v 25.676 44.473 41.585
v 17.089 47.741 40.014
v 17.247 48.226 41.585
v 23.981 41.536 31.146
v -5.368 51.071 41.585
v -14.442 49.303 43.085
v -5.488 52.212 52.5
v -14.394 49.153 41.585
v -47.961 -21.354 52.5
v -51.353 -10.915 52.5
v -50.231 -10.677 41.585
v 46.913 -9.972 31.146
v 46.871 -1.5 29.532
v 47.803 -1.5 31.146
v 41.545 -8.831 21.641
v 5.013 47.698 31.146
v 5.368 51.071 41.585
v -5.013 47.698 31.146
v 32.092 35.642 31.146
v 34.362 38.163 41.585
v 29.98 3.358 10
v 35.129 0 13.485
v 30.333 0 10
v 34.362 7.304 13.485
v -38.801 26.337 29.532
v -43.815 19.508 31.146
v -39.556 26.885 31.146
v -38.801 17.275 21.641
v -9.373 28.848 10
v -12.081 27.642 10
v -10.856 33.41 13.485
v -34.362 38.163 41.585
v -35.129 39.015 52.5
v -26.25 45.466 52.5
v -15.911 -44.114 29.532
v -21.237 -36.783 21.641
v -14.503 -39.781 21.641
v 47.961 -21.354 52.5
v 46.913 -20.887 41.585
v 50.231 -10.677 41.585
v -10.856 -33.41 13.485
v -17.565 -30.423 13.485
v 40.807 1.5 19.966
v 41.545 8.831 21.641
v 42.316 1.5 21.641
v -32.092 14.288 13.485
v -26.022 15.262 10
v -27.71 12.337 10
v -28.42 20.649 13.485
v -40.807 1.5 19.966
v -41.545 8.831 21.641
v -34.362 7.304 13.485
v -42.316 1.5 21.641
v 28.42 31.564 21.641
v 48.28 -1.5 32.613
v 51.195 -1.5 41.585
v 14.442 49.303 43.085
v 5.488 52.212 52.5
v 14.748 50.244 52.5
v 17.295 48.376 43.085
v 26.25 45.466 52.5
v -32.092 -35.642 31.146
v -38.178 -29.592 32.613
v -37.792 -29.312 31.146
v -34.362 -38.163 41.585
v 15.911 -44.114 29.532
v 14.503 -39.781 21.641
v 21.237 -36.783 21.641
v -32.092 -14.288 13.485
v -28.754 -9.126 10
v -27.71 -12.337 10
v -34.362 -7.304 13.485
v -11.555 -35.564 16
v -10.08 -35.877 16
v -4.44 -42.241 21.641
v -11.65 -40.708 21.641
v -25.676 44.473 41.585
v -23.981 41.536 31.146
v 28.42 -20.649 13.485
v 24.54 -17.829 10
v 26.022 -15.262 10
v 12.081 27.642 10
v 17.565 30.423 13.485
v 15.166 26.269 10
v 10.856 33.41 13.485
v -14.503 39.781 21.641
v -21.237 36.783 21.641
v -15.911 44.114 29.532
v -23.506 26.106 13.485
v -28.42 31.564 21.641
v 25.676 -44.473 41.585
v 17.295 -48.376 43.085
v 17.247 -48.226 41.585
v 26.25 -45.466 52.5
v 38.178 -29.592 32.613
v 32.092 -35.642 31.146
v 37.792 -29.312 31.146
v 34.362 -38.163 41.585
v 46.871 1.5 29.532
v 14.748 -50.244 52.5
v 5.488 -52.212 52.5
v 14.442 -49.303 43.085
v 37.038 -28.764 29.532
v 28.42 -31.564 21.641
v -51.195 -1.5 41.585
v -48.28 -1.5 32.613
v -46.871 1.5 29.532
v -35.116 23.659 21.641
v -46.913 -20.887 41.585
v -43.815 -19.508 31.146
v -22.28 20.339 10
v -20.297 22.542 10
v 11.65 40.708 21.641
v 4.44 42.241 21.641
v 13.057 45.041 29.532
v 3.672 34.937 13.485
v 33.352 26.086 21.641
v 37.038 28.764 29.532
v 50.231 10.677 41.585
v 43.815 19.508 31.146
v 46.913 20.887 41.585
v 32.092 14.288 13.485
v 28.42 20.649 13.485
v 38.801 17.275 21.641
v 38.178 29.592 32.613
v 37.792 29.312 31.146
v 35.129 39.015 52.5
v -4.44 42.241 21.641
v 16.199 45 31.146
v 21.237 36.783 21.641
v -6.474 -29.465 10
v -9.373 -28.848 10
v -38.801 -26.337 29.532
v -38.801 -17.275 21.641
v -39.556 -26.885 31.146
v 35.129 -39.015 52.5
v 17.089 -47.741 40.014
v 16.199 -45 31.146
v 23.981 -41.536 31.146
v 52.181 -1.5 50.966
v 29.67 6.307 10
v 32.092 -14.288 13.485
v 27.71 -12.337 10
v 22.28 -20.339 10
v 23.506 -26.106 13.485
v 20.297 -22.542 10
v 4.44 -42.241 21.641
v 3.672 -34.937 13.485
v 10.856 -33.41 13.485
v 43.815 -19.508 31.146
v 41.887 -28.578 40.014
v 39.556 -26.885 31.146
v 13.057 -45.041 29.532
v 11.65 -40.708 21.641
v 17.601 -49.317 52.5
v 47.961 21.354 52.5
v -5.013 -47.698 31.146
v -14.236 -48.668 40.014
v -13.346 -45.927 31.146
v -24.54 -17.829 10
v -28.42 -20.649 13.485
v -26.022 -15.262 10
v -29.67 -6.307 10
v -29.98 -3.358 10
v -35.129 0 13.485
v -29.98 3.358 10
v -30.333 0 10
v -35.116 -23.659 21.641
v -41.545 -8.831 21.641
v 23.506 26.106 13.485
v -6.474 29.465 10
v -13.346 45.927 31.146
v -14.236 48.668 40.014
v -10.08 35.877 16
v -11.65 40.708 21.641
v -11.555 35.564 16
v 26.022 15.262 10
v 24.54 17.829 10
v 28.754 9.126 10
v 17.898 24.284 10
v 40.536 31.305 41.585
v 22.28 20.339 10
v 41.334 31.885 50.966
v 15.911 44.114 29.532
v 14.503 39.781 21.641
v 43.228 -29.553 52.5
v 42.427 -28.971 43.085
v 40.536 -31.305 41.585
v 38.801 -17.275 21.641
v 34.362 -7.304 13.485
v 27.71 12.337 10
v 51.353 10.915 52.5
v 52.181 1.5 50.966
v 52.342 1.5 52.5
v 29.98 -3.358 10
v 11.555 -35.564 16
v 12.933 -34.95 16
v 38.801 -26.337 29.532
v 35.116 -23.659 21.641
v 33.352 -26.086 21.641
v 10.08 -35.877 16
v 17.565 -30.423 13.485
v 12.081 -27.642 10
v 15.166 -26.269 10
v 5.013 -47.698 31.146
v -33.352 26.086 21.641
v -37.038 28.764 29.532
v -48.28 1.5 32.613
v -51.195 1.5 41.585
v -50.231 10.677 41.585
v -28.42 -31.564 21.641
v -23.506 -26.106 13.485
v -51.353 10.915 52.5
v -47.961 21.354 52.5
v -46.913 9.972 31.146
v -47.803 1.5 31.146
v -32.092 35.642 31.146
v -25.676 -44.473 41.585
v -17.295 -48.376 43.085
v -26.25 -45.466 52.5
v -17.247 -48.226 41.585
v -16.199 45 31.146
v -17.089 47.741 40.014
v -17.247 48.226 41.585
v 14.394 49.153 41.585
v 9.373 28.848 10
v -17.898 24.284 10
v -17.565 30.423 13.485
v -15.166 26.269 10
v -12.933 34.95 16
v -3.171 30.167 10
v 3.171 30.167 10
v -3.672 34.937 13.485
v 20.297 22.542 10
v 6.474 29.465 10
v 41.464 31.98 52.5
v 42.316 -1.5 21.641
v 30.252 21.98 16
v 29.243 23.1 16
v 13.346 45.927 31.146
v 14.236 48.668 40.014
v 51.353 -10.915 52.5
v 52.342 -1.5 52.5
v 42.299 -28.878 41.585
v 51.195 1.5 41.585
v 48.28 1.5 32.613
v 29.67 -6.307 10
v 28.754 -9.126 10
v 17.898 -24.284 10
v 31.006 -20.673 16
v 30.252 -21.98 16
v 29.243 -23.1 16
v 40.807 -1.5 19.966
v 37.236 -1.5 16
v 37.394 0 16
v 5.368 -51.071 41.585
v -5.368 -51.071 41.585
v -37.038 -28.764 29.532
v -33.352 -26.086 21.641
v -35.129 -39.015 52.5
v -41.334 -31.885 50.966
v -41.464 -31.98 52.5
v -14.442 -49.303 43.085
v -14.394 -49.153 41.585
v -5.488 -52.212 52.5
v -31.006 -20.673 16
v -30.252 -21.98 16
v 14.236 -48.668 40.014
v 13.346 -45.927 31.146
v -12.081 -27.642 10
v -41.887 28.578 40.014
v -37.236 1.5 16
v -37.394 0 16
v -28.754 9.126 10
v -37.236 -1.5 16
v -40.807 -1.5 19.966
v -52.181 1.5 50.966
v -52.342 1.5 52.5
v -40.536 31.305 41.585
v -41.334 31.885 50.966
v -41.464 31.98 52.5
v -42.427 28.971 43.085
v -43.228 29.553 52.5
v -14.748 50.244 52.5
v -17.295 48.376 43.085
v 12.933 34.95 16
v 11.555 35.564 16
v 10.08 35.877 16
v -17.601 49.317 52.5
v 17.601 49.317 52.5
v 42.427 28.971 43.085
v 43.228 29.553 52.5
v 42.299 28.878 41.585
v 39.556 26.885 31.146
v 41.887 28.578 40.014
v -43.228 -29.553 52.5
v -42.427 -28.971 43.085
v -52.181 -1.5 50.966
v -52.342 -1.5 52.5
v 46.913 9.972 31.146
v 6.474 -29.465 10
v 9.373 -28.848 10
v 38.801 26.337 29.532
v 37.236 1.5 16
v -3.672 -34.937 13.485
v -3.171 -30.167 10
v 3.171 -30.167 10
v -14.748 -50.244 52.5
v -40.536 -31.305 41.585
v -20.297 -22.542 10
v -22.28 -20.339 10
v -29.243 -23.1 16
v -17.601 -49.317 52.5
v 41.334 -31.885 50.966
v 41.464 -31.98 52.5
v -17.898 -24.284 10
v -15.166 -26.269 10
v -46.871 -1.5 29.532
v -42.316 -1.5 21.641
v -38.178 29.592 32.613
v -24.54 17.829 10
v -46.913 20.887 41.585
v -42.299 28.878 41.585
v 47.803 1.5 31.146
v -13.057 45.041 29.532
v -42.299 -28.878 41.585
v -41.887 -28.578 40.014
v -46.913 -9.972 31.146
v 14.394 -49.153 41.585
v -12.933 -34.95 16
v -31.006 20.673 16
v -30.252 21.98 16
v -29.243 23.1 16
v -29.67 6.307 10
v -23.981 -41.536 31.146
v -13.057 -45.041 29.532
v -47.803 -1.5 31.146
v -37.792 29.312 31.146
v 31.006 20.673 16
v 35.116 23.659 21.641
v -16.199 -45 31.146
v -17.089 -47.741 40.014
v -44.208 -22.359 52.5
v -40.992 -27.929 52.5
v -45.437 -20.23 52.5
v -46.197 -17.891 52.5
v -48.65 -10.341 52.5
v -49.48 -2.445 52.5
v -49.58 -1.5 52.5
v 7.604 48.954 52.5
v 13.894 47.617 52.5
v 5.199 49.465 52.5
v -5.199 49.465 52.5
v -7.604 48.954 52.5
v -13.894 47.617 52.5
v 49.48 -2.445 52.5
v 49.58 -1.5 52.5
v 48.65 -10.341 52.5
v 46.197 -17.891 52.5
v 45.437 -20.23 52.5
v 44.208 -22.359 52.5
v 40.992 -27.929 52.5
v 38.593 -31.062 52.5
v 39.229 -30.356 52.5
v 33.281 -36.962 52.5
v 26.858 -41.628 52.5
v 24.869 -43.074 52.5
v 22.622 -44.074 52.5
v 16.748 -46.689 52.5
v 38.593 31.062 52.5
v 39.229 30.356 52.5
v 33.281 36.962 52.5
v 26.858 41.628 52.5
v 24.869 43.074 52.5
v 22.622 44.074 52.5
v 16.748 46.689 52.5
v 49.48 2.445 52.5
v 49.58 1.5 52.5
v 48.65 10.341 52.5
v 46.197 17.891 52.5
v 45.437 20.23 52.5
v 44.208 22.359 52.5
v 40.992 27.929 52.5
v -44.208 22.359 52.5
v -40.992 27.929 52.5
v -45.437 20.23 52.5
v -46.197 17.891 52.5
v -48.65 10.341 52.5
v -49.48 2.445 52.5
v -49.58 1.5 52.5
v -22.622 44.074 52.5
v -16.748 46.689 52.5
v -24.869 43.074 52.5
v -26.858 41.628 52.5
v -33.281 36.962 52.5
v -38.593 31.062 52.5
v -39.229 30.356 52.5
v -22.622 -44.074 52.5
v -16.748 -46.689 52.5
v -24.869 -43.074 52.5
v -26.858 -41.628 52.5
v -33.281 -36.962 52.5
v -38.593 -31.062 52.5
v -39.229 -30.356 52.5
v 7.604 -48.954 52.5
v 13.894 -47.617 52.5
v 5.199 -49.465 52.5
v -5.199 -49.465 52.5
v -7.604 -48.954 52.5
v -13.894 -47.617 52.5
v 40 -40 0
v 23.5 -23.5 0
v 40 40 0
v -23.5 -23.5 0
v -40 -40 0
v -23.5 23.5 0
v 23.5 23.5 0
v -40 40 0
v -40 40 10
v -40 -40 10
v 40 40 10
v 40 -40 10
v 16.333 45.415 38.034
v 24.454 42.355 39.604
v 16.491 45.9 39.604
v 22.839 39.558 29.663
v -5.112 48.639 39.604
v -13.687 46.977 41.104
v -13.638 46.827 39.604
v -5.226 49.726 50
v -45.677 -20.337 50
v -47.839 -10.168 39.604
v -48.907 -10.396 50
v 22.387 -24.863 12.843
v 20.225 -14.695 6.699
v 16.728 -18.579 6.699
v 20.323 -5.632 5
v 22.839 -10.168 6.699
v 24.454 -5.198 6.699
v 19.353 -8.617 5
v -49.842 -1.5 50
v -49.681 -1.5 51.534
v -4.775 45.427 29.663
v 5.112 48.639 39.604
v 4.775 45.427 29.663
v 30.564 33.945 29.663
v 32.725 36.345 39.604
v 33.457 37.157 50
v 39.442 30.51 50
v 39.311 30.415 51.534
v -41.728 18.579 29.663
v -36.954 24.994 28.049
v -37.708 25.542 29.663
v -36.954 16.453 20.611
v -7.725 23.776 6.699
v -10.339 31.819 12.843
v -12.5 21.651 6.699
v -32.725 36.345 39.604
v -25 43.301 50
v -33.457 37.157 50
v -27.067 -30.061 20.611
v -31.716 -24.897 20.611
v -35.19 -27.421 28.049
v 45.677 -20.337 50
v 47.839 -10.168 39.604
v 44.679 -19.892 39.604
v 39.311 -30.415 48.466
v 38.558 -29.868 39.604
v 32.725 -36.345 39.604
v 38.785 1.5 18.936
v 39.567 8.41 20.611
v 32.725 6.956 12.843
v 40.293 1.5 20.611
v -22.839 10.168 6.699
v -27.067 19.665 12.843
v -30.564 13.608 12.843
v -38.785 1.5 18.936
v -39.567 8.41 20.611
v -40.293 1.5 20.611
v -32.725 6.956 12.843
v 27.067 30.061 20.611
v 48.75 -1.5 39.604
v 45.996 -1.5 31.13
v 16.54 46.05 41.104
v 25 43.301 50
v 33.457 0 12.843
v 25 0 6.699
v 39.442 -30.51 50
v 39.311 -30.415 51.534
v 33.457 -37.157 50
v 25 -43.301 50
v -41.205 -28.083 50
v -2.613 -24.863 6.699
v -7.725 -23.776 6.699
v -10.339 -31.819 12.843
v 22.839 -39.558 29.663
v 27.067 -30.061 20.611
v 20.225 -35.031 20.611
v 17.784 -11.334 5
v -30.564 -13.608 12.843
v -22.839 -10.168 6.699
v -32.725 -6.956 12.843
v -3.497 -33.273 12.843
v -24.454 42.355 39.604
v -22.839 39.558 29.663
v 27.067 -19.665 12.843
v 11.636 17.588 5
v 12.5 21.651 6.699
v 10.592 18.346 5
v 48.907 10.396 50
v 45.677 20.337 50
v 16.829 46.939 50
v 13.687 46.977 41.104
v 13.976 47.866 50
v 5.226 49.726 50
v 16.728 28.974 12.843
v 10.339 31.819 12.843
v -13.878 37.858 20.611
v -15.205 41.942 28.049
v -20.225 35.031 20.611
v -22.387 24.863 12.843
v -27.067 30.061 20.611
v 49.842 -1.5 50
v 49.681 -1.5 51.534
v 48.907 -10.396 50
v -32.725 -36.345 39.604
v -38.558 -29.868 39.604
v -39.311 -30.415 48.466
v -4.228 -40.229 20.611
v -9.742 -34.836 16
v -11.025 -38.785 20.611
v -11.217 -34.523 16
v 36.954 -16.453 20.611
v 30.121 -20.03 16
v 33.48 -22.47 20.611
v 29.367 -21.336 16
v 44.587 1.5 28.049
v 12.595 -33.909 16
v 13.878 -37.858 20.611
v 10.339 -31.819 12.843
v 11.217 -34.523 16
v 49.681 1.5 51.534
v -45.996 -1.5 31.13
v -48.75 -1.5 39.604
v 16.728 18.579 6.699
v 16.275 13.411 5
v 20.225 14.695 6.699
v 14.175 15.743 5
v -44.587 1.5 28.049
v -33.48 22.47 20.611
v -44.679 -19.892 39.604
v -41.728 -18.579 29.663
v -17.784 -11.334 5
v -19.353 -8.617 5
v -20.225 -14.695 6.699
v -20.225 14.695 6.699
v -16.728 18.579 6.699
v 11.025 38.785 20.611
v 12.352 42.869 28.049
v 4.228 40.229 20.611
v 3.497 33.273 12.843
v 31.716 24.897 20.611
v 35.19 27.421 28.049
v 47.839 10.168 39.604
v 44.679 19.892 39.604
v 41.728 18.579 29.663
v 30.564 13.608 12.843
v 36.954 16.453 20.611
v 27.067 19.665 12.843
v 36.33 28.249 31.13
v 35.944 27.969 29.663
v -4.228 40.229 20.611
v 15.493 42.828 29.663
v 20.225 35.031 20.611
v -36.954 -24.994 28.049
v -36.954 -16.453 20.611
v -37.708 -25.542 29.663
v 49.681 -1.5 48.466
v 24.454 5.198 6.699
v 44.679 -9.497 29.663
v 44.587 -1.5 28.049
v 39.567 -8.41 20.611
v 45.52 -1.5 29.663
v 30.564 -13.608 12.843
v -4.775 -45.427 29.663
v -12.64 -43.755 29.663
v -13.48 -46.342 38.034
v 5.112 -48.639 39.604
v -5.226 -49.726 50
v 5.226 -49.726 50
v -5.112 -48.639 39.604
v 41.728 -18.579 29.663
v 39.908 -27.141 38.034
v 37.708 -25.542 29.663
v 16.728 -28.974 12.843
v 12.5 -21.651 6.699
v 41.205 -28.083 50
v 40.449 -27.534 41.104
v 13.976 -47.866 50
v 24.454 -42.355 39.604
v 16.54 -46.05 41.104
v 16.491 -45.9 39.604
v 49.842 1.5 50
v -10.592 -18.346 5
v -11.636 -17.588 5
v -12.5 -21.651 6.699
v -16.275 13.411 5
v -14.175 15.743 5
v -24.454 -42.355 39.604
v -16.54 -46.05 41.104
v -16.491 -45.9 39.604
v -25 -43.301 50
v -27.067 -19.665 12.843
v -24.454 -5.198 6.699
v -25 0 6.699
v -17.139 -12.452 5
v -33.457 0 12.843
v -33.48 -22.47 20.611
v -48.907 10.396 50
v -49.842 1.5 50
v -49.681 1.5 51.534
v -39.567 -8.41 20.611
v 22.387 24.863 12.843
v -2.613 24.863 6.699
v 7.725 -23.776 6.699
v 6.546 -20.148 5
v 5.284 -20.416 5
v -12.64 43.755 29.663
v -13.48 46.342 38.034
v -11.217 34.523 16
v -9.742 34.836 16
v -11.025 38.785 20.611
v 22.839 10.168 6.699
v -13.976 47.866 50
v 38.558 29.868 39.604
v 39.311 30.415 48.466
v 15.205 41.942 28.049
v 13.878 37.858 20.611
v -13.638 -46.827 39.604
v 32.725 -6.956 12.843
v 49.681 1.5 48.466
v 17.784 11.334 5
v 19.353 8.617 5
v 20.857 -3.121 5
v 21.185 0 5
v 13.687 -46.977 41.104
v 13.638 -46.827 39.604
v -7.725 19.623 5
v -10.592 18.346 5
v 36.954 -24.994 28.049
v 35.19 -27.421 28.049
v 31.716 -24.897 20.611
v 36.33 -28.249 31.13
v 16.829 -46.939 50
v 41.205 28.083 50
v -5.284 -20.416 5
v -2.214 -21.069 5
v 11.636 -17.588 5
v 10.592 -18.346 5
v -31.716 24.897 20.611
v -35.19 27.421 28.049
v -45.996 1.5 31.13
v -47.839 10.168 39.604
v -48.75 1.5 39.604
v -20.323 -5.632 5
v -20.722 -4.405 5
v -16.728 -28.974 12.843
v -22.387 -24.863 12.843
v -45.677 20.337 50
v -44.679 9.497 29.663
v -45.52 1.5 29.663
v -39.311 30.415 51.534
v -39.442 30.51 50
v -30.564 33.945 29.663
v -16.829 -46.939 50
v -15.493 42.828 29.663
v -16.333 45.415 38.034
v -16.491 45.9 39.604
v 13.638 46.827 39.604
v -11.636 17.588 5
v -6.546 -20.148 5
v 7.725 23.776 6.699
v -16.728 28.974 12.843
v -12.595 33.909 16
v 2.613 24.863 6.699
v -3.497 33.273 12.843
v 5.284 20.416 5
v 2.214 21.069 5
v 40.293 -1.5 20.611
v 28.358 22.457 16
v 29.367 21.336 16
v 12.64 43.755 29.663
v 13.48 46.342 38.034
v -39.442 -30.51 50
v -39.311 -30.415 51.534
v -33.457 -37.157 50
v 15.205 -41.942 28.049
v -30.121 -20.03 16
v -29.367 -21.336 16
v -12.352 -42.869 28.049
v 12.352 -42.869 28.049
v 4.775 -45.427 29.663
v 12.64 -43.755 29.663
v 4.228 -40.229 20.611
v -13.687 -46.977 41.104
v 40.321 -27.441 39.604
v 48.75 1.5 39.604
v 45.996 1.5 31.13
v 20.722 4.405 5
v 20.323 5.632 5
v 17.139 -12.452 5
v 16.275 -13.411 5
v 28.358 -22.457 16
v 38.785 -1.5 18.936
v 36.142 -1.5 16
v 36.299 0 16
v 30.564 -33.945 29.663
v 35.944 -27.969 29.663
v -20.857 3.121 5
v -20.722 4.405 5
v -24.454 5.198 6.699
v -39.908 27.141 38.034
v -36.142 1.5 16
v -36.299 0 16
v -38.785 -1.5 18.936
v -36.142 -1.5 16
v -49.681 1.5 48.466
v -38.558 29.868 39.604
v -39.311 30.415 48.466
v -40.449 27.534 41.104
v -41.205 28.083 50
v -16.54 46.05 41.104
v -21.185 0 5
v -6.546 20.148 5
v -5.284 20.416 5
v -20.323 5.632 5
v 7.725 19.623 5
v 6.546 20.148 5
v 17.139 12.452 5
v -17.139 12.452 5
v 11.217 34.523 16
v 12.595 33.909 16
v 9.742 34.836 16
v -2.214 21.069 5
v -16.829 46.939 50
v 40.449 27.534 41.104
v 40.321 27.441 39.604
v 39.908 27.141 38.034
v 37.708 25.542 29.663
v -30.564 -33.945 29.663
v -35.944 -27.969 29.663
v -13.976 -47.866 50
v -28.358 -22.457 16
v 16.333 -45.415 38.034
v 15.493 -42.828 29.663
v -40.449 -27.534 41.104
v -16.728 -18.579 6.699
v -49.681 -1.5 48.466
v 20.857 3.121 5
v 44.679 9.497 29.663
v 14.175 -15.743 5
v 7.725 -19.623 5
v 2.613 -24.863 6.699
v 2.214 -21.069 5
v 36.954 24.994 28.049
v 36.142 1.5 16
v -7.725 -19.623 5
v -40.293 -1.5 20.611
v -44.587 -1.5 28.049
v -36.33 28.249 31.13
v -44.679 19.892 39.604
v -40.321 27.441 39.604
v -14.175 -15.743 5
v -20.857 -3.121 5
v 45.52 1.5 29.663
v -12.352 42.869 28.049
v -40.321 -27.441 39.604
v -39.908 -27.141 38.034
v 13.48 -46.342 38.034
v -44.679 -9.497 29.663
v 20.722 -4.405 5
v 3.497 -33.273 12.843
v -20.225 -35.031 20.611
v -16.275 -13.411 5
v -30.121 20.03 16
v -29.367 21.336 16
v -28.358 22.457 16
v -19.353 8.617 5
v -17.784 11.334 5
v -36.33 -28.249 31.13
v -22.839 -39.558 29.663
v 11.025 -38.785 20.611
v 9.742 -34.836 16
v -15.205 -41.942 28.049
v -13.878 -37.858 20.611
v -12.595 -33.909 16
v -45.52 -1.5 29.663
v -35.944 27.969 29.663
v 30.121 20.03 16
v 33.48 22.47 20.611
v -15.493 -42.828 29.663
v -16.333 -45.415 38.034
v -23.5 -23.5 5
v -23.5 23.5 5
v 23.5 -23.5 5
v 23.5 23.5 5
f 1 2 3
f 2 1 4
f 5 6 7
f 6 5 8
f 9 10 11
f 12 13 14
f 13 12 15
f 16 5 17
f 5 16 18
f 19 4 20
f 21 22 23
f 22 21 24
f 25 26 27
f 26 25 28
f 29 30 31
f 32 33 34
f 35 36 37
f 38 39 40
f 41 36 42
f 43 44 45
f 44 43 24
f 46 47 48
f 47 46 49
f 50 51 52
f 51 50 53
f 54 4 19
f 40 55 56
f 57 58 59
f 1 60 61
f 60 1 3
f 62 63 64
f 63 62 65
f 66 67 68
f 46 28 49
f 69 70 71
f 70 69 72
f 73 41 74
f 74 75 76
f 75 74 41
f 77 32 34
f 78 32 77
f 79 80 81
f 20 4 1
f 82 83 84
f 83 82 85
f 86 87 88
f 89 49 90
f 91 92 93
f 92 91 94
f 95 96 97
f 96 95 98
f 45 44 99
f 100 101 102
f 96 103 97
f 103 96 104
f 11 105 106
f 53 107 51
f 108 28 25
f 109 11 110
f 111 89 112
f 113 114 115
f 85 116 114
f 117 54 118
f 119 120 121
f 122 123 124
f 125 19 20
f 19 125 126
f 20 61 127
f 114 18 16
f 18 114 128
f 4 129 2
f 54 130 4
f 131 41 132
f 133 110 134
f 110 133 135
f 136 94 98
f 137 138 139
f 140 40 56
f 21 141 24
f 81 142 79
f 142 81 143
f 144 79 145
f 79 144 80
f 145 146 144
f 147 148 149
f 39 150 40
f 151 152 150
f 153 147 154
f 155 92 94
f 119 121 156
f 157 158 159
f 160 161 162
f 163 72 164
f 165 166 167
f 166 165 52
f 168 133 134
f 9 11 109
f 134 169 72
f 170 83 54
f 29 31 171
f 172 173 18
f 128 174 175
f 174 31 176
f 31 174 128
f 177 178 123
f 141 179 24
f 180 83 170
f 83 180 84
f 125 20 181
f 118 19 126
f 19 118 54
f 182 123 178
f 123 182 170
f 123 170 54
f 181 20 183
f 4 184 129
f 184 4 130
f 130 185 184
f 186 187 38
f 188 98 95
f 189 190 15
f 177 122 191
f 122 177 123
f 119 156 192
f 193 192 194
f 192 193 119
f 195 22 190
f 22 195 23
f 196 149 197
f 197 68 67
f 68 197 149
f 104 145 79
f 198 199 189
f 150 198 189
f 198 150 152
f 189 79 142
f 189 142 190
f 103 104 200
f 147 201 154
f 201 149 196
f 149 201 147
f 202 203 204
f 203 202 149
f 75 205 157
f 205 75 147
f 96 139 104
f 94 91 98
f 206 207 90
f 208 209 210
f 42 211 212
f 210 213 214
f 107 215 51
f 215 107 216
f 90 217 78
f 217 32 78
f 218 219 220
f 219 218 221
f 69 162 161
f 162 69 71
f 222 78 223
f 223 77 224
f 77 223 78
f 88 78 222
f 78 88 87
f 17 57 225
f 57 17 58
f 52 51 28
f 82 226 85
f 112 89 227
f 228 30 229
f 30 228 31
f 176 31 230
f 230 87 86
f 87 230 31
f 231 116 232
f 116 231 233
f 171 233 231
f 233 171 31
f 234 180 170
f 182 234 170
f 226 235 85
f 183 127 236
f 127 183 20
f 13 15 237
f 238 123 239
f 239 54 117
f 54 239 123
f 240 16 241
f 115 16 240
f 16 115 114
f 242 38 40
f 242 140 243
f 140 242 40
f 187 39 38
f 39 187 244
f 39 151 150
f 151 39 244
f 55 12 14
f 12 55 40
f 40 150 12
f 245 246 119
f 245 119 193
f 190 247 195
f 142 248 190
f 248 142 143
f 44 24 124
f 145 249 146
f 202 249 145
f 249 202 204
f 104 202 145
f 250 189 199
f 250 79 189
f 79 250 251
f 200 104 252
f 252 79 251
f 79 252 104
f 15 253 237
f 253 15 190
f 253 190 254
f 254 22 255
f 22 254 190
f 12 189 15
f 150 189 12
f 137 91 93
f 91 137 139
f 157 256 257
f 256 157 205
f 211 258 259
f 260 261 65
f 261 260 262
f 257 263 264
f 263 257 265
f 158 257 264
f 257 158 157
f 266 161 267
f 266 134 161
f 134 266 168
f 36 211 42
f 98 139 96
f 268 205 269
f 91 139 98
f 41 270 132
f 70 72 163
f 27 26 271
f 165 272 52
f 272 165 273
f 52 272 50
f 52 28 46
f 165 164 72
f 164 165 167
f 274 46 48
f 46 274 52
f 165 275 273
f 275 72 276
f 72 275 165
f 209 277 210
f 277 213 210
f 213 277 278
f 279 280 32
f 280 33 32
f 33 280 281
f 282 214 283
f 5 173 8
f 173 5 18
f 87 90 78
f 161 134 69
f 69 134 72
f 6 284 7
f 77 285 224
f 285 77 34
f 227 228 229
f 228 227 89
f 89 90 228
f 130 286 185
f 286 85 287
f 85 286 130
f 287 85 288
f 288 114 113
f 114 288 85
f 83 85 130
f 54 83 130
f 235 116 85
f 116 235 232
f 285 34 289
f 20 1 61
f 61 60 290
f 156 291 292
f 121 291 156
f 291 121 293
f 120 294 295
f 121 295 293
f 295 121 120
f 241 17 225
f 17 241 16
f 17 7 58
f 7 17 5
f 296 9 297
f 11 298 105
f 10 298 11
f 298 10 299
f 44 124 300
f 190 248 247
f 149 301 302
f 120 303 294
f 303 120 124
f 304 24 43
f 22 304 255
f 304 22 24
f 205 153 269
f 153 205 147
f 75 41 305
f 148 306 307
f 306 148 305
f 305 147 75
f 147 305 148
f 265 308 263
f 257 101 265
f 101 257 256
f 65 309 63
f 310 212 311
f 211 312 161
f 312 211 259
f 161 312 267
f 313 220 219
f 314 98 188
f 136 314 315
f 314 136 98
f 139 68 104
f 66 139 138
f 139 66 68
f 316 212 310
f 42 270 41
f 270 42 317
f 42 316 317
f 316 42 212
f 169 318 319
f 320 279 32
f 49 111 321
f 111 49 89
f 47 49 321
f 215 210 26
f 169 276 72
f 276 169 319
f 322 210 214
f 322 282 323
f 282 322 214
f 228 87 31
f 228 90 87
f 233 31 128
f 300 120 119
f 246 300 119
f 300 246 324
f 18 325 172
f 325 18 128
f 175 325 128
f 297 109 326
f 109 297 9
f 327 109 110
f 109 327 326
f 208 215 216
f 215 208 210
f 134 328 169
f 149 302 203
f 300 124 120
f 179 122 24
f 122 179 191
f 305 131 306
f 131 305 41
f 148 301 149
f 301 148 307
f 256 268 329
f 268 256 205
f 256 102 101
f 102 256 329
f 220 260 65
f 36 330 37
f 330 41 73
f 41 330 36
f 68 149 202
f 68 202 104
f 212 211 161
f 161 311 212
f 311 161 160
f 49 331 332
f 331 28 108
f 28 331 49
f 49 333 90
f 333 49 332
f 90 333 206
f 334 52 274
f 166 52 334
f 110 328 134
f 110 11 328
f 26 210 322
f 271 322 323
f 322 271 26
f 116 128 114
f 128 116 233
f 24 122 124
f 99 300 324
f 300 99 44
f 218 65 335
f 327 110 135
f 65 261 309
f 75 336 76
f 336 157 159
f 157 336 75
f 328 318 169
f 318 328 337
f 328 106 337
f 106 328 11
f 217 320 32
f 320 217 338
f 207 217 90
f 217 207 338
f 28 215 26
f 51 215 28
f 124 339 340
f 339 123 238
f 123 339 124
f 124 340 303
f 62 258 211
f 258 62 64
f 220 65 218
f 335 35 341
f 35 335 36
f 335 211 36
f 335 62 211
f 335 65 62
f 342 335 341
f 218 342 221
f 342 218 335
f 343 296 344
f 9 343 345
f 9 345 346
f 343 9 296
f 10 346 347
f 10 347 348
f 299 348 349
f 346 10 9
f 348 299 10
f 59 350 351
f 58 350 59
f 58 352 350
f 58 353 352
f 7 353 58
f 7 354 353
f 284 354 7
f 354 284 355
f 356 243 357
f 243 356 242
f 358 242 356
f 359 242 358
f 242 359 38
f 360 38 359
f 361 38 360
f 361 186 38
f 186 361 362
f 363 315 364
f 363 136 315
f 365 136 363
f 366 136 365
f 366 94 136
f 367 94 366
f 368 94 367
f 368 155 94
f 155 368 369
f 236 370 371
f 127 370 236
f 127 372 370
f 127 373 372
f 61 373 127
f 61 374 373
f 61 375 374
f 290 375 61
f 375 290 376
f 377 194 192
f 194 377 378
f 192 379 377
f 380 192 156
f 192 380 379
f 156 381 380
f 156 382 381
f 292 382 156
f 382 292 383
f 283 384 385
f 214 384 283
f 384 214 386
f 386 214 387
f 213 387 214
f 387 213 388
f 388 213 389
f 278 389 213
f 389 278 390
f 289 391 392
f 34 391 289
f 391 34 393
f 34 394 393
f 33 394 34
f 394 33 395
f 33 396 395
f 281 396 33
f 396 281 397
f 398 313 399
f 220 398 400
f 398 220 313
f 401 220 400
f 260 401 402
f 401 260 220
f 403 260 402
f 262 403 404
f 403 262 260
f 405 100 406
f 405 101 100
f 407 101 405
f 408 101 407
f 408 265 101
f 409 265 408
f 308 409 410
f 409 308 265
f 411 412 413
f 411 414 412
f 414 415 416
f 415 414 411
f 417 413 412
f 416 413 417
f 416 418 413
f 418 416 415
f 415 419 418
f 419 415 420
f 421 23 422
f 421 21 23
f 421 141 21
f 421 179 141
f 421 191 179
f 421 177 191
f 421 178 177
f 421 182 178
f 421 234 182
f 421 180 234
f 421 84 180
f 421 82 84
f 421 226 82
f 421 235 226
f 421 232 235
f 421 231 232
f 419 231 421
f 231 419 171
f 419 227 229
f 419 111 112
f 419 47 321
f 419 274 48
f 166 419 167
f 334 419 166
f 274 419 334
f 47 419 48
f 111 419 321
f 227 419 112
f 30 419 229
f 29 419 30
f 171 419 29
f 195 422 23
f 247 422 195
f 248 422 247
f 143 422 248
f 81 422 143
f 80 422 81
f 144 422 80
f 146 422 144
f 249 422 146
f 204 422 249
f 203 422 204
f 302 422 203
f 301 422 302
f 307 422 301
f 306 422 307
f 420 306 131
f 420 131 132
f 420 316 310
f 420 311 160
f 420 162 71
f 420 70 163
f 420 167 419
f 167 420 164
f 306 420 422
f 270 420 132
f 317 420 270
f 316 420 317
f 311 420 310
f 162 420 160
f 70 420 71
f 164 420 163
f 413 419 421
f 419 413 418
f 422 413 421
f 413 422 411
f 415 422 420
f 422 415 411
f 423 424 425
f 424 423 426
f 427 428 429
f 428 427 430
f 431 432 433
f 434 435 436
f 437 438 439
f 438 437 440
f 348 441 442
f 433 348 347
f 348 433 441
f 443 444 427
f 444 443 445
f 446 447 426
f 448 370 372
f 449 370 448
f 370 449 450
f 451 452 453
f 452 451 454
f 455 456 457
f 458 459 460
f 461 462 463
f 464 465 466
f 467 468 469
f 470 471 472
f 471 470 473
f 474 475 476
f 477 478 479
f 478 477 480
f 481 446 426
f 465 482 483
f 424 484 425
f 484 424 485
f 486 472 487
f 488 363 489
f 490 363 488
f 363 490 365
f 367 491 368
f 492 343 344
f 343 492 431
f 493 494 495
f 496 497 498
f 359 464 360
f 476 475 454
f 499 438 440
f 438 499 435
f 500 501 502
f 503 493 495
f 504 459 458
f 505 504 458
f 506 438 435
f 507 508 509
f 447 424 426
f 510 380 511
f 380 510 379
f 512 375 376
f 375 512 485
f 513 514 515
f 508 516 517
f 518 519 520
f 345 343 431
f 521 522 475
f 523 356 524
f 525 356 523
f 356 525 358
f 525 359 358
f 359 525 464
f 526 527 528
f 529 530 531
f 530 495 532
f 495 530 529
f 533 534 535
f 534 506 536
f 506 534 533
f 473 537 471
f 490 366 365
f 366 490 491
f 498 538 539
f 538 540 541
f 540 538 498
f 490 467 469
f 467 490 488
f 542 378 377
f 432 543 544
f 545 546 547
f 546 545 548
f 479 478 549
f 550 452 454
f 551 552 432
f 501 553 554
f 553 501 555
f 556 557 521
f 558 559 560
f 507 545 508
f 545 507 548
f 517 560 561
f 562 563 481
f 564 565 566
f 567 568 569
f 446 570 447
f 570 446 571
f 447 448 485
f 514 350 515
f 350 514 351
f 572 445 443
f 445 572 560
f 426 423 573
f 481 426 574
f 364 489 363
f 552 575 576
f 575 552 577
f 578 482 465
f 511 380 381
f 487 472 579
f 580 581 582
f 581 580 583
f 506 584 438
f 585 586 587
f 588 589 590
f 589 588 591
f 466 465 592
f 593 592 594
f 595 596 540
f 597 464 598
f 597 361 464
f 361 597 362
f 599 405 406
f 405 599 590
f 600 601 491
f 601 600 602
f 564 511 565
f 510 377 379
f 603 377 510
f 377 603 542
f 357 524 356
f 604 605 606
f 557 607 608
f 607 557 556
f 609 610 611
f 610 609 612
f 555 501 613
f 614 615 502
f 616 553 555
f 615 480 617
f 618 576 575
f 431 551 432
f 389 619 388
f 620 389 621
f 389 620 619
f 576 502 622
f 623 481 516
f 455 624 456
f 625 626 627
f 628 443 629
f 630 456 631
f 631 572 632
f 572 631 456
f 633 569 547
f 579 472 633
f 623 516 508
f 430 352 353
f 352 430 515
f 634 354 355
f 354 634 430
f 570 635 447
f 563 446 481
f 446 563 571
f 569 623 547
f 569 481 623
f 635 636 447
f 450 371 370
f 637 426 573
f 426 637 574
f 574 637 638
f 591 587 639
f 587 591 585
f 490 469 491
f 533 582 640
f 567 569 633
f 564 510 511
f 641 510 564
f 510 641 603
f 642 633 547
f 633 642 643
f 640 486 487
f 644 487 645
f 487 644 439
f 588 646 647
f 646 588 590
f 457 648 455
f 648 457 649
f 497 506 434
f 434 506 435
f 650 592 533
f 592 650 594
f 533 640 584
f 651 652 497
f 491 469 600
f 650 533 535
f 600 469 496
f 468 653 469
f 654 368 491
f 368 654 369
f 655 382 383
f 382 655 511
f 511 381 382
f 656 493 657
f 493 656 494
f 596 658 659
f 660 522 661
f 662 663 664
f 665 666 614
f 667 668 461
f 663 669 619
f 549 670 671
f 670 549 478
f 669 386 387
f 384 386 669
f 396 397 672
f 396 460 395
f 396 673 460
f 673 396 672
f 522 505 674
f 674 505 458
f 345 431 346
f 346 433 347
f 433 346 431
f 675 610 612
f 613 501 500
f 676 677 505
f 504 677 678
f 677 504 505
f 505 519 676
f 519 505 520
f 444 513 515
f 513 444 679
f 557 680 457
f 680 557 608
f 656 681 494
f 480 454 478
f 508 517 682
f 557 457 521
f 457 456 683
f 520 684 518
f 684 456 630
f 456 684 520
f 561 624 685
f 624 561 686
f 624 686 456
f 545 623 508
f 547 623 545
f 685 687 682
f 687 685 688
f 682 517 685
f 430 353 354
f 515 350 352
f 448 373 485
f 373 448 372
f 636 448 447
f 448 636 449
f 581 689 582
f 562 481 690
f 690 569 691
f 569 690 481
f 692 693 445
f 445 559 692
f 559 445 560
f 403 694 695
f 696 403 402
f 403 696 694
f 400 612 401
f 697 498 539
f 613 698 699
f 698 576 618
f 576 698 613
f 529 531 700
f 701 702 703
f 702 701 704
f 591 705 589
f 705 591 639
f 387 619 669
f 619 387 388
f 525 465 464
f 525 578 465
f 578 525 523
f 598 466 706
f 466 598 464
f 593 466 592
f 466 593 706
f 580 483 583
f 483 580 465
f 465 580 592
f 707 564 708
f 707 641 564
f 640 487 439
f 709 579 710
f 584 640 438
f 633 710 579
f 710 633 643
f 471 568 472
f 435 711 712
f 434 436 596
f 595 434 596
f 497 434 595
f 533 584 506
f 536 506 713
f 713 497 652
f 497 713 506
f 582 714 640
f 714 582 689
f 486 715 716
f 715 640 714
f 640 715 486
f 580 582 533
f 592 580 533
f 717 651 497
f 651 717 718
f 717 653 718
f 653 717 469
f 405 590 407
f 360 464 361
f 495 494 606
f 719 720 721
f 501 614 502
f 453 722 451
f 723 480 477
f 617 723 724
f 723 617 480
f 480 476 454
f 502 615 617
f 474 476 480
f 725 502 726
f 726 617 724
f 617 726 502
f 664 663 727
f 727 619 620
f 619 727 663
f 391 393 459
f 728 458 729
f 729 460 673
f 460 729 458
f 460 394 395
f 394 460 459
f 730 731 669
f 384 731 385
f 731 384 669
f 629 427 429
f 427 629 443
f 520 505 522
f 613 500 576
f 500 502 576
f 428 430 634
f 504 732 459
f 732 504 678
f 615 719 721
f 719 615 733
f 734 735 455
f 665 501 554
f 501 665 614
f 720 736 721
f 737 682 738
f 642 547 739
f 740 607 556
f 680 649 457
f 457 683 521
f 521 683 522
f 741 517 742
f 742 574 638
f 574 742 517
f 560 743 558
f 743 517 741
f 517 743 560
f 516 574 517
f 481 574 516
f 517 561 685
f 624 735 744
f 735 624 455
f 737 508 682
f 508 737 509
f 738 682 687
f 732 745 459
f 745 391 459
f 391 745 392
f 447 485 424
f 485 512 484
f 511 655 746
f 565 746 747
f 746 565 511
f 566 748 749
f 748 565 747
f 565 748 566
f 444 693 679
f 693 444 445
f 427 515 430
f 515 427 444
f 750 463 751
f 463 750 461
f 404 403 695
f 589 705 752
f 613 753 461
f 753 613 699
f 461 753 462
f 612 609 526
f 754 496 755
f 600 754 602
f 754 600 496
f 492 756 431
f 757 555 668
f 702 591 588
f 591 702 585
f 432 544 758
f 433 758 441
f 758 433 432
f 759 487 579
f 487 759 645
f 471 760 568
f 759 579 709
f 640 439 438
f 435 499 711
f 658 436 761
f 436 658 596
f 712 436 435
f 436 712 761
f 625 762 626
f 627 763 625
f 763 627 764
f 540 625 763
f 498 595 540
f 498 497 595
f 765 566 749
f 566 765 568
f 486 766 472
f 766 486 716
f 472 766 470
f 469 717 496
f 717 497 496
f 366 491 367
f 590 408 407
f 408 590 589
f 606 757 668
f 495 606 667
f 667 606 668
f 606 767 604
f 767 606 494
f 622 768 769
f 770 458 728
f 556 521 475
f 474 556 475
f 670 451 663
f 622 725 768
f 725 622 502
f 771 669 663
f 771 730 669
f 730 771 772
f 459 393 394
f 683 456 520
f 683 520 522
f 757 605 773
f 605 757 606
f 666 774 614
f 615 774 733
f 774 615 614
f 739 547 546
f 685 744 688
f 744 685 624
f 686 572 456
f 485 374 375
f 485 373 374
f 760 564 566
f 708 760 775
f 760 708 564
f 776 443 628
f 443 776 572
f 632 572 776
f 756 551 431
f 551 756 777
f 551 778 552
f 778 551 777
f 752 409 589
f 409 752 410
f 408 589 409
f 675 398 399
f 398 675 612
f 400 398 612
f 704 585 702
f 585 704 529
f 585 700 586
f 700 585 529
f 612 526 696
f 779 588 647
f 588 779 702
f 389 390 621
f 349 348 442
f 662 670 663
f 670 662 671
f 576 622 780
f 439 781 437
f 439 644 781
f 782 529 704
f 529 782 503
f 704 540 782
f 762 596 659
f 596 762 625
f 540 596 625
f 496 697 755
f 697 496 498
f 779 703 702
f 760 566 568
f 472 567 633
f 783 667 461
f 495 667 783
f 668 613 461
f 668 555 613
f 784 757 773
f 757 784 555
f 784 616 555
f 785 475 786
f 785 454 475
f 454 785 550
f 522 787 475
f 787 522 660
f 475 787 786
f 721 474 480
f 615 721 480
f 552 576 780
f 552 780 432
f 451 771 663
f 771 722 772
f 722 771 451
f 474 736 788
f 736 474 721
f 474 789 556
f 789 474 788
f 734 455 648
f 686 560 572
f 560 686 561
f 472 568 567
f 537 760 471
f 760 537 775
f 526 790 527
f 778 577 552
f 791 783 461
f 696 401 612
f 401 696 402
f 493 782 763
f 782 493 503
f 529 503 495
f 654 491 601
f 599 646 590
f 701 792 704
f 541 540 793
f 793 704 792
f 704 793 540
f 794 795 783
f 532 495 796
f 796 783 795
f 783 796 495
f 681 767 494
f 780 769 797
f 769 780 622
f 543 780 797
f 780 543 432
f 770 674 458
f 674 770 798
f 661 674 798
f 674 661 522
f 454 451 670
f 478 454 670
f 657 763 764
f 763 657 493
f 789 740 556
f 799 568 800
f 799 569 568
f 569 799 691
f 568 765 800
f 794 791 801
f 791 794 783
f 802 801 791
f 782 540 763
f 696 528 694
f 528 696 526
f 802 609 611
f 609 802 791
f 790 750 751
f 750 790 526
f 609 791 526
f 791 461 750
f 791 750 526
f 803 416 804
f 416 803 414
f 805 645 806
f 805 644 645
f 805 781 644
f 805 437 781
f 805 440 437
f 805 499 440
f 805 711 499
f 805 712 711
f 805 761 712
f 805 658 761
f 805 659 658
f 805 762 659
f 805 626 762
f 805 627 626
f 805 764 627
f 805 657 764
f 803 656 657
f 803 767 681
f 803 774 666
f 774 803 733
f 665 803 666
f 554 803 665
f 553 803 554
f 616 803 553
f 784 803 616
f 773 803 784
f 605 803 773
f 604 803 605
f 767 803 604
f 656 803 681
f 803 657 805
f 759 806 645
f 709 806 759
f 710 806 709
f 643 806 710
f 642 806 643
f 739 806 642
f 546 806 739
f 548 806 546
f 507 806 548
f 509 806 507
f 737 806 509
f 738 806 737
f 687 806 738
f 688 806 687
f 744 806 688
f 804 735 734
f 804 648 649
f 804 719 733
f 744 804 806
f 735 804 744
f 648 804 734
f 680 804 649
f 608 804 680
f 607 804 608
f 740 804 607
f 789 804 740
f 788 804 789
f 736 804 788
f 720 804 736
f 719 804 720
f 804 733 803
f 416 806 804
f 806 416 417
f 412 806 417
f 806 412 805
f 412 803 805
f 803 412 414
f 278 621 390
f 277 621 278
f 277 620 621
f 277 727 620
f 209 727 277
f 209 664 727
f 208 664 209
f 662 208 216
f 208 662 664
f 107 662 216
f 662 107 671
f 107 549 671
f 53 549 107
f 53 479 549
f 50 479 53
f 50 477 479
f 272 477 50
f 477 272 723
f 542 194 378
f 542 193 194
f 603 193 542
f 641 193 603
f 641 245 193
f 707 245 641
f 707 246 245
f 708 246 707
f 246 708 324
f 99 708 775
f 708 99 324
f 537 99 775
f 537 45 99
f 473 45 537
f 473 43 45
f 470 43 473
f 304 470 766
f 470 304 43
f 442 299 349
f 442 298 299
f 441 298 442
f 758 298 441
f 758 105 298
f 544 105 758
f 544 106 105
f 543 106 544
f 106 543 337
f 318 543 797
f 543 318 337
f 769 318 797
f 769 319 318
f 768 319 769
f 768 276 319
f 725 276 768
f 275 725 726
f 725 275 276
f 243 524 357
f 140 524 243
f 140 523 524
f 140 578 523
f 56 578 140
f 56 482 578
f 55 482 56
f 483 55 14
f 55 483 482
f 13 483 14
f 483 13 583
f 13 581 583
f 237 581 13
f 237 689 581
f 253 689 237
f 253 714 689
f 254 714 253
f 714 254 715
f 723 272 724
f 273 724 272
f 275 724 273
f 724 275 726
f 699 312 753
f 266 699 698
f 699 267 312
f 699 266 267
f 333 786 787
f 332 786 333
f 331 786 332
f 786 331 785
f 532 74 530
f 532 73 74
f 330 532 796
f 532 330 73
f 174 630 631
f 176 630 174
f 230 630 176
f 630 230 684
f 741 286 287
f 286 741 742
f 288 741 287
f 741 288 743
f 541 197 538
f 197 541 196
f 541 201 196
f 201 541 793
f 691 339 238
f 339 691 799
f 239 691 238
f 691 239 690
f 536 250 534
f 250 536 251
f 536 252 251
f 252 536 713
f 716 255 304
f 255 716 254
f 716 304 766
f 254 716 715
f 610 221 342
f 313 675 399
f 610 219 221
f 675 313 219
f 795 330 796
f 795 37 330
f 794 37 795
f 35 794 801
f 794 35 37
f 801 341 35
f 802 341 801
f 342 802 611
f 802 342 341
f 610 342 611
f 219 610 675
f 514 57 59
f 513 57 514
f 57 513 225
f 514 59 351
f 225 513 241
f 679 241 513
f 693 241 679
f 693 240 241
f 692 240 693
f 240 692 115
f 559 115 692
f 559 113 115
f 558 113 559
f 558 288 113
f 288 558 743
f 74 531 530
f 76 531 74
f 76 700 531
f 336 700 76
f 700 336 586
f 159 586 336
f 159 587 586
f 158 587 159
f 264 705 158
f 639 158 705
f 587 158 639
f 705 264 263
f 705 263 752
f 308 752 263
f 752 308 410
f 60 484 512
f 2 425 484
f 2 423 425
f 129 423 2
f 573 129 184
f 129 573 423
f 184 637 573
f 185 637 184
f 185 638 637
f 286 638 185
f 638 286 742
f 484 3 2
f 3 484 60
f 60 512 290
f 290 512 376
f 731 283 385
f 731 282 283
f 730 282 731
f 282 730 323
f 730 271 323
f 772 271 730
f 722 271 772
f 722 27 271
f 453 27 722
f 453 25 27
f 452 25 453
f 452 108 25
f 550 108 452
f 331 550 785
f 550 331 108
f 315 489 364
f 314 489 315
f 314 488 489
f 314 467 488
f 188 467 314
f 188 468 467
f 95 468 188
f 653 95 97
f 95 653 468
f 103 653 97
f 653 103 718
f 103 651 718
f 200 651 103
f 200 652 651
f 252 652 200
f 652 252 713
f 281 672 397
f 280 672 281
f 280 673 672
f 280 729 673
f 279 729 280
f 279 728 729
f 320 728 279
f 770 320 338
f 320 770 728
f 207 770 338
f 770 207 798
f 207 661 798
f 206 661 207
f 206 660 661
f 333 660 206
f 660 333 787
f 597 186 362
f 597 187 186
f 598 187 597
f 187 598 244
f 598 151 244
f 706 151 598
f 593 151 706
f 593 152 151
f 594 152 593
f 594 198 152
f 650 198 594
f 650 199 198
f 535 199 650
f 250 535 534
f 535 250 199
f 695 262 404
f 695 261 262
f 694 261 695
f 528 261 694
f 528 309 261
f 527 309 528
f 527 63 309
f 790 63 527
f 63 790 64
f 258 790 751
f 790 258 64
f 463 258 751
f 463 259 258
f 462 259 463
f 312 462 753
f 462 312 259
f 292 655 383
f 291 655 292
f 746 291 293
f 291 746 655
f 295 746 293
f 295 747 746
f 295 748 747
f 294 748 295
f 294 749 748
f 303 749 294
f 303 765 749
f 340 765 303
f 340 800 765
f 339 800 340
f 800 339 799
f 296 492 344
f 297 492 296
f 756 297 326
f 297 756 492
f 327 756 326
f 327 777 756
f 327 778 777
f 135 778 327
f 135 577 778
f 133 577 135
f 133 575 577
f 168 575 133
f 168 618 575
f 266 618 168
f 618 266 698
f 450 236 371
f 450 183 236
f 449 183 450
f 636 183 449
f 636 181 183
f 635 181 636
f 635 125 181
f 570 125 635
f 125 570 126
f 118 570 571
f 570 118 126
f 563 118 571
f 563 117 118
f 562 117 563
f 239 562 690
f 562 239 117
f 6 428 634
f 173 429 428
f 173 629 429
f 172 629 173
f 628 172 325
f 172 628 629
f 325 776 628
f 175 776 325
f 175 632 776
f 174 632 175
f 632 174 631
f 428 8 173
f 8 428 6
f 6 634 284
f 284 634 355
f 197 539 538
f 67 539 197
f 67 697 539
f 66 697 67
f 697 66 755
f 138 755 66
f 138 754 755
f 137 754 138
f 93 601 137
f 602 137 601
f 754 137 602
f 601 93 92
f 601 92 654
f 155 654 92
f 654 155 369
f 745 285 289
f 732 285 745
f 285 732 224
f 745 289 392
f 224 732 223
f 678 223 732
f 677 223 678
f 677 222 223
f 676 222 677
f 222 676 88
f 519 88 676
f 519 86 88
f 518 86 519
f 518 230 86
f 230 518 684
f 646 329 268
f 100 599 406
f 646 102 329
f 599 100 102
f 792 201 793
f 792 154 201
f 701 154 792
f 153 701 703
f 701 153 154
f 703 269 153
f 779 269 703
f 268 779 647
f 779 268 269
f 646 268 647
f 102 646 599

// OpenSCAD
// Generated by SolidPython 0.4.6 on 2020-03-19 19:10:30


difference(){
	difference() {
		union() {
			scale(v = 1.0500000000) {
				translate(v = [0, 0, 50]) {
					difference() {
						sphere(r = 50);
						translate(v = [0, 0, 50]) {
							cube(center = true, size = 100);
						}
					}
				}
			}
			difference() {
				linear_extrude(height = 10) {
					square(center = true, size = 80);
				}
			}
		}
	}
	/* Holes Below*/
	union(){
		union(){
			translate(v = [0, 0, 50]) {
				sphere(r = 50);
			}
			union(){
				linear_extrude(height = 5.0000000000) {
					square(center = true, size = 47);
				}
			}
		}
		union() {
			rotate(a = 0, v = [0, 0, 1]) {
				translate(v = [0, 0, 16]) {
					translate(v = [-250.0000000000, 0, 0]) {
						rotate(a = 90, v = [1, 0, 0]) {
							translate(v = [0, 0, -1.5000000000]) {
								linear_extrude(height = 3) {
									square(size = 500);
								}
							}
						}
					}
				}
			}
			rotate(a = 72, v = [0, 0, 1]) {
				translate(v = [0, 0, 16]) {
					translate(v = [-250.0000000000, 0, 0]) {
						rotate(a = 90, v = [1, 0, 0]) {
							translate(v = [0, 0, -1.5000000000]) {
								linear_extrude(height = 3) {
									square(size = 500);
								}
							}
						}
					}
				}
			}
			rotate(a = 144, v = [0, 0, 1]) {
				translate(v = [0, 0, 16]) {
					translate(v = [-250.0000000000, 0, 0]) {
						rotate(a = 90, v = [1, 0, 0]) {
							translate(v = [0, 0, -1.5000000000]) {
								linear_extrude(height = 3) {
									square(size = 500);
								}
							}
						}
					}
				}
			}
			rotate(a = 216, v = [0, 0, 1]) {
				translate(v = [0, 0, 16]) {
					translate(v = [-250.0000000000, 0, 0]) {
						rotate(a = 90, v = [1, 0, 0]) {
							translate(v = [0, 0, -1.5000000000]) {
								linear_extrude(height = 3) {
									square(size = 500);
								}
							}
						}
					}
				}
			}
			rotate(a = 288, v = [0, 0, 1]) {
				translate(v = [0, 0, 16]) {
					translate(v = [-250.0000000000, 0, 0]) {
						rotate(a = 90, v = [1, 0, 0]) {
							translate(v = [0, 0, -1.5000000000]) {
								linear_extrude(height = 3) {
									square(size = 500);
								}
							}
						}
					}
				}
			}
		}
	} /* End Holes */ 
}
/***********************************************
*********      SolidPython code:      **********
************************************************
 
from .lib.grinder_base import GrinderBase
from .lib.dell_connector import DellConnector
from .lib.holder.round_holder import RoundHolder

from solid import *
from solid.utils import *  # Not required, but the utils module is useful


base = GrinderBase()

#top = GrinderBase.custom_diameter(90, 17)

#connector = DellConnector(x_holders=4, y_holders=2)

#scad = connector.rotate_to_print(connector.multiple_dell_holder())
#scad = connector.multiple_dell_holder()

#scad = RoundHolder().completeHolder()

scad_render_to_file(scad, "coffee-grinder3.scad") 
 
************************************************/
